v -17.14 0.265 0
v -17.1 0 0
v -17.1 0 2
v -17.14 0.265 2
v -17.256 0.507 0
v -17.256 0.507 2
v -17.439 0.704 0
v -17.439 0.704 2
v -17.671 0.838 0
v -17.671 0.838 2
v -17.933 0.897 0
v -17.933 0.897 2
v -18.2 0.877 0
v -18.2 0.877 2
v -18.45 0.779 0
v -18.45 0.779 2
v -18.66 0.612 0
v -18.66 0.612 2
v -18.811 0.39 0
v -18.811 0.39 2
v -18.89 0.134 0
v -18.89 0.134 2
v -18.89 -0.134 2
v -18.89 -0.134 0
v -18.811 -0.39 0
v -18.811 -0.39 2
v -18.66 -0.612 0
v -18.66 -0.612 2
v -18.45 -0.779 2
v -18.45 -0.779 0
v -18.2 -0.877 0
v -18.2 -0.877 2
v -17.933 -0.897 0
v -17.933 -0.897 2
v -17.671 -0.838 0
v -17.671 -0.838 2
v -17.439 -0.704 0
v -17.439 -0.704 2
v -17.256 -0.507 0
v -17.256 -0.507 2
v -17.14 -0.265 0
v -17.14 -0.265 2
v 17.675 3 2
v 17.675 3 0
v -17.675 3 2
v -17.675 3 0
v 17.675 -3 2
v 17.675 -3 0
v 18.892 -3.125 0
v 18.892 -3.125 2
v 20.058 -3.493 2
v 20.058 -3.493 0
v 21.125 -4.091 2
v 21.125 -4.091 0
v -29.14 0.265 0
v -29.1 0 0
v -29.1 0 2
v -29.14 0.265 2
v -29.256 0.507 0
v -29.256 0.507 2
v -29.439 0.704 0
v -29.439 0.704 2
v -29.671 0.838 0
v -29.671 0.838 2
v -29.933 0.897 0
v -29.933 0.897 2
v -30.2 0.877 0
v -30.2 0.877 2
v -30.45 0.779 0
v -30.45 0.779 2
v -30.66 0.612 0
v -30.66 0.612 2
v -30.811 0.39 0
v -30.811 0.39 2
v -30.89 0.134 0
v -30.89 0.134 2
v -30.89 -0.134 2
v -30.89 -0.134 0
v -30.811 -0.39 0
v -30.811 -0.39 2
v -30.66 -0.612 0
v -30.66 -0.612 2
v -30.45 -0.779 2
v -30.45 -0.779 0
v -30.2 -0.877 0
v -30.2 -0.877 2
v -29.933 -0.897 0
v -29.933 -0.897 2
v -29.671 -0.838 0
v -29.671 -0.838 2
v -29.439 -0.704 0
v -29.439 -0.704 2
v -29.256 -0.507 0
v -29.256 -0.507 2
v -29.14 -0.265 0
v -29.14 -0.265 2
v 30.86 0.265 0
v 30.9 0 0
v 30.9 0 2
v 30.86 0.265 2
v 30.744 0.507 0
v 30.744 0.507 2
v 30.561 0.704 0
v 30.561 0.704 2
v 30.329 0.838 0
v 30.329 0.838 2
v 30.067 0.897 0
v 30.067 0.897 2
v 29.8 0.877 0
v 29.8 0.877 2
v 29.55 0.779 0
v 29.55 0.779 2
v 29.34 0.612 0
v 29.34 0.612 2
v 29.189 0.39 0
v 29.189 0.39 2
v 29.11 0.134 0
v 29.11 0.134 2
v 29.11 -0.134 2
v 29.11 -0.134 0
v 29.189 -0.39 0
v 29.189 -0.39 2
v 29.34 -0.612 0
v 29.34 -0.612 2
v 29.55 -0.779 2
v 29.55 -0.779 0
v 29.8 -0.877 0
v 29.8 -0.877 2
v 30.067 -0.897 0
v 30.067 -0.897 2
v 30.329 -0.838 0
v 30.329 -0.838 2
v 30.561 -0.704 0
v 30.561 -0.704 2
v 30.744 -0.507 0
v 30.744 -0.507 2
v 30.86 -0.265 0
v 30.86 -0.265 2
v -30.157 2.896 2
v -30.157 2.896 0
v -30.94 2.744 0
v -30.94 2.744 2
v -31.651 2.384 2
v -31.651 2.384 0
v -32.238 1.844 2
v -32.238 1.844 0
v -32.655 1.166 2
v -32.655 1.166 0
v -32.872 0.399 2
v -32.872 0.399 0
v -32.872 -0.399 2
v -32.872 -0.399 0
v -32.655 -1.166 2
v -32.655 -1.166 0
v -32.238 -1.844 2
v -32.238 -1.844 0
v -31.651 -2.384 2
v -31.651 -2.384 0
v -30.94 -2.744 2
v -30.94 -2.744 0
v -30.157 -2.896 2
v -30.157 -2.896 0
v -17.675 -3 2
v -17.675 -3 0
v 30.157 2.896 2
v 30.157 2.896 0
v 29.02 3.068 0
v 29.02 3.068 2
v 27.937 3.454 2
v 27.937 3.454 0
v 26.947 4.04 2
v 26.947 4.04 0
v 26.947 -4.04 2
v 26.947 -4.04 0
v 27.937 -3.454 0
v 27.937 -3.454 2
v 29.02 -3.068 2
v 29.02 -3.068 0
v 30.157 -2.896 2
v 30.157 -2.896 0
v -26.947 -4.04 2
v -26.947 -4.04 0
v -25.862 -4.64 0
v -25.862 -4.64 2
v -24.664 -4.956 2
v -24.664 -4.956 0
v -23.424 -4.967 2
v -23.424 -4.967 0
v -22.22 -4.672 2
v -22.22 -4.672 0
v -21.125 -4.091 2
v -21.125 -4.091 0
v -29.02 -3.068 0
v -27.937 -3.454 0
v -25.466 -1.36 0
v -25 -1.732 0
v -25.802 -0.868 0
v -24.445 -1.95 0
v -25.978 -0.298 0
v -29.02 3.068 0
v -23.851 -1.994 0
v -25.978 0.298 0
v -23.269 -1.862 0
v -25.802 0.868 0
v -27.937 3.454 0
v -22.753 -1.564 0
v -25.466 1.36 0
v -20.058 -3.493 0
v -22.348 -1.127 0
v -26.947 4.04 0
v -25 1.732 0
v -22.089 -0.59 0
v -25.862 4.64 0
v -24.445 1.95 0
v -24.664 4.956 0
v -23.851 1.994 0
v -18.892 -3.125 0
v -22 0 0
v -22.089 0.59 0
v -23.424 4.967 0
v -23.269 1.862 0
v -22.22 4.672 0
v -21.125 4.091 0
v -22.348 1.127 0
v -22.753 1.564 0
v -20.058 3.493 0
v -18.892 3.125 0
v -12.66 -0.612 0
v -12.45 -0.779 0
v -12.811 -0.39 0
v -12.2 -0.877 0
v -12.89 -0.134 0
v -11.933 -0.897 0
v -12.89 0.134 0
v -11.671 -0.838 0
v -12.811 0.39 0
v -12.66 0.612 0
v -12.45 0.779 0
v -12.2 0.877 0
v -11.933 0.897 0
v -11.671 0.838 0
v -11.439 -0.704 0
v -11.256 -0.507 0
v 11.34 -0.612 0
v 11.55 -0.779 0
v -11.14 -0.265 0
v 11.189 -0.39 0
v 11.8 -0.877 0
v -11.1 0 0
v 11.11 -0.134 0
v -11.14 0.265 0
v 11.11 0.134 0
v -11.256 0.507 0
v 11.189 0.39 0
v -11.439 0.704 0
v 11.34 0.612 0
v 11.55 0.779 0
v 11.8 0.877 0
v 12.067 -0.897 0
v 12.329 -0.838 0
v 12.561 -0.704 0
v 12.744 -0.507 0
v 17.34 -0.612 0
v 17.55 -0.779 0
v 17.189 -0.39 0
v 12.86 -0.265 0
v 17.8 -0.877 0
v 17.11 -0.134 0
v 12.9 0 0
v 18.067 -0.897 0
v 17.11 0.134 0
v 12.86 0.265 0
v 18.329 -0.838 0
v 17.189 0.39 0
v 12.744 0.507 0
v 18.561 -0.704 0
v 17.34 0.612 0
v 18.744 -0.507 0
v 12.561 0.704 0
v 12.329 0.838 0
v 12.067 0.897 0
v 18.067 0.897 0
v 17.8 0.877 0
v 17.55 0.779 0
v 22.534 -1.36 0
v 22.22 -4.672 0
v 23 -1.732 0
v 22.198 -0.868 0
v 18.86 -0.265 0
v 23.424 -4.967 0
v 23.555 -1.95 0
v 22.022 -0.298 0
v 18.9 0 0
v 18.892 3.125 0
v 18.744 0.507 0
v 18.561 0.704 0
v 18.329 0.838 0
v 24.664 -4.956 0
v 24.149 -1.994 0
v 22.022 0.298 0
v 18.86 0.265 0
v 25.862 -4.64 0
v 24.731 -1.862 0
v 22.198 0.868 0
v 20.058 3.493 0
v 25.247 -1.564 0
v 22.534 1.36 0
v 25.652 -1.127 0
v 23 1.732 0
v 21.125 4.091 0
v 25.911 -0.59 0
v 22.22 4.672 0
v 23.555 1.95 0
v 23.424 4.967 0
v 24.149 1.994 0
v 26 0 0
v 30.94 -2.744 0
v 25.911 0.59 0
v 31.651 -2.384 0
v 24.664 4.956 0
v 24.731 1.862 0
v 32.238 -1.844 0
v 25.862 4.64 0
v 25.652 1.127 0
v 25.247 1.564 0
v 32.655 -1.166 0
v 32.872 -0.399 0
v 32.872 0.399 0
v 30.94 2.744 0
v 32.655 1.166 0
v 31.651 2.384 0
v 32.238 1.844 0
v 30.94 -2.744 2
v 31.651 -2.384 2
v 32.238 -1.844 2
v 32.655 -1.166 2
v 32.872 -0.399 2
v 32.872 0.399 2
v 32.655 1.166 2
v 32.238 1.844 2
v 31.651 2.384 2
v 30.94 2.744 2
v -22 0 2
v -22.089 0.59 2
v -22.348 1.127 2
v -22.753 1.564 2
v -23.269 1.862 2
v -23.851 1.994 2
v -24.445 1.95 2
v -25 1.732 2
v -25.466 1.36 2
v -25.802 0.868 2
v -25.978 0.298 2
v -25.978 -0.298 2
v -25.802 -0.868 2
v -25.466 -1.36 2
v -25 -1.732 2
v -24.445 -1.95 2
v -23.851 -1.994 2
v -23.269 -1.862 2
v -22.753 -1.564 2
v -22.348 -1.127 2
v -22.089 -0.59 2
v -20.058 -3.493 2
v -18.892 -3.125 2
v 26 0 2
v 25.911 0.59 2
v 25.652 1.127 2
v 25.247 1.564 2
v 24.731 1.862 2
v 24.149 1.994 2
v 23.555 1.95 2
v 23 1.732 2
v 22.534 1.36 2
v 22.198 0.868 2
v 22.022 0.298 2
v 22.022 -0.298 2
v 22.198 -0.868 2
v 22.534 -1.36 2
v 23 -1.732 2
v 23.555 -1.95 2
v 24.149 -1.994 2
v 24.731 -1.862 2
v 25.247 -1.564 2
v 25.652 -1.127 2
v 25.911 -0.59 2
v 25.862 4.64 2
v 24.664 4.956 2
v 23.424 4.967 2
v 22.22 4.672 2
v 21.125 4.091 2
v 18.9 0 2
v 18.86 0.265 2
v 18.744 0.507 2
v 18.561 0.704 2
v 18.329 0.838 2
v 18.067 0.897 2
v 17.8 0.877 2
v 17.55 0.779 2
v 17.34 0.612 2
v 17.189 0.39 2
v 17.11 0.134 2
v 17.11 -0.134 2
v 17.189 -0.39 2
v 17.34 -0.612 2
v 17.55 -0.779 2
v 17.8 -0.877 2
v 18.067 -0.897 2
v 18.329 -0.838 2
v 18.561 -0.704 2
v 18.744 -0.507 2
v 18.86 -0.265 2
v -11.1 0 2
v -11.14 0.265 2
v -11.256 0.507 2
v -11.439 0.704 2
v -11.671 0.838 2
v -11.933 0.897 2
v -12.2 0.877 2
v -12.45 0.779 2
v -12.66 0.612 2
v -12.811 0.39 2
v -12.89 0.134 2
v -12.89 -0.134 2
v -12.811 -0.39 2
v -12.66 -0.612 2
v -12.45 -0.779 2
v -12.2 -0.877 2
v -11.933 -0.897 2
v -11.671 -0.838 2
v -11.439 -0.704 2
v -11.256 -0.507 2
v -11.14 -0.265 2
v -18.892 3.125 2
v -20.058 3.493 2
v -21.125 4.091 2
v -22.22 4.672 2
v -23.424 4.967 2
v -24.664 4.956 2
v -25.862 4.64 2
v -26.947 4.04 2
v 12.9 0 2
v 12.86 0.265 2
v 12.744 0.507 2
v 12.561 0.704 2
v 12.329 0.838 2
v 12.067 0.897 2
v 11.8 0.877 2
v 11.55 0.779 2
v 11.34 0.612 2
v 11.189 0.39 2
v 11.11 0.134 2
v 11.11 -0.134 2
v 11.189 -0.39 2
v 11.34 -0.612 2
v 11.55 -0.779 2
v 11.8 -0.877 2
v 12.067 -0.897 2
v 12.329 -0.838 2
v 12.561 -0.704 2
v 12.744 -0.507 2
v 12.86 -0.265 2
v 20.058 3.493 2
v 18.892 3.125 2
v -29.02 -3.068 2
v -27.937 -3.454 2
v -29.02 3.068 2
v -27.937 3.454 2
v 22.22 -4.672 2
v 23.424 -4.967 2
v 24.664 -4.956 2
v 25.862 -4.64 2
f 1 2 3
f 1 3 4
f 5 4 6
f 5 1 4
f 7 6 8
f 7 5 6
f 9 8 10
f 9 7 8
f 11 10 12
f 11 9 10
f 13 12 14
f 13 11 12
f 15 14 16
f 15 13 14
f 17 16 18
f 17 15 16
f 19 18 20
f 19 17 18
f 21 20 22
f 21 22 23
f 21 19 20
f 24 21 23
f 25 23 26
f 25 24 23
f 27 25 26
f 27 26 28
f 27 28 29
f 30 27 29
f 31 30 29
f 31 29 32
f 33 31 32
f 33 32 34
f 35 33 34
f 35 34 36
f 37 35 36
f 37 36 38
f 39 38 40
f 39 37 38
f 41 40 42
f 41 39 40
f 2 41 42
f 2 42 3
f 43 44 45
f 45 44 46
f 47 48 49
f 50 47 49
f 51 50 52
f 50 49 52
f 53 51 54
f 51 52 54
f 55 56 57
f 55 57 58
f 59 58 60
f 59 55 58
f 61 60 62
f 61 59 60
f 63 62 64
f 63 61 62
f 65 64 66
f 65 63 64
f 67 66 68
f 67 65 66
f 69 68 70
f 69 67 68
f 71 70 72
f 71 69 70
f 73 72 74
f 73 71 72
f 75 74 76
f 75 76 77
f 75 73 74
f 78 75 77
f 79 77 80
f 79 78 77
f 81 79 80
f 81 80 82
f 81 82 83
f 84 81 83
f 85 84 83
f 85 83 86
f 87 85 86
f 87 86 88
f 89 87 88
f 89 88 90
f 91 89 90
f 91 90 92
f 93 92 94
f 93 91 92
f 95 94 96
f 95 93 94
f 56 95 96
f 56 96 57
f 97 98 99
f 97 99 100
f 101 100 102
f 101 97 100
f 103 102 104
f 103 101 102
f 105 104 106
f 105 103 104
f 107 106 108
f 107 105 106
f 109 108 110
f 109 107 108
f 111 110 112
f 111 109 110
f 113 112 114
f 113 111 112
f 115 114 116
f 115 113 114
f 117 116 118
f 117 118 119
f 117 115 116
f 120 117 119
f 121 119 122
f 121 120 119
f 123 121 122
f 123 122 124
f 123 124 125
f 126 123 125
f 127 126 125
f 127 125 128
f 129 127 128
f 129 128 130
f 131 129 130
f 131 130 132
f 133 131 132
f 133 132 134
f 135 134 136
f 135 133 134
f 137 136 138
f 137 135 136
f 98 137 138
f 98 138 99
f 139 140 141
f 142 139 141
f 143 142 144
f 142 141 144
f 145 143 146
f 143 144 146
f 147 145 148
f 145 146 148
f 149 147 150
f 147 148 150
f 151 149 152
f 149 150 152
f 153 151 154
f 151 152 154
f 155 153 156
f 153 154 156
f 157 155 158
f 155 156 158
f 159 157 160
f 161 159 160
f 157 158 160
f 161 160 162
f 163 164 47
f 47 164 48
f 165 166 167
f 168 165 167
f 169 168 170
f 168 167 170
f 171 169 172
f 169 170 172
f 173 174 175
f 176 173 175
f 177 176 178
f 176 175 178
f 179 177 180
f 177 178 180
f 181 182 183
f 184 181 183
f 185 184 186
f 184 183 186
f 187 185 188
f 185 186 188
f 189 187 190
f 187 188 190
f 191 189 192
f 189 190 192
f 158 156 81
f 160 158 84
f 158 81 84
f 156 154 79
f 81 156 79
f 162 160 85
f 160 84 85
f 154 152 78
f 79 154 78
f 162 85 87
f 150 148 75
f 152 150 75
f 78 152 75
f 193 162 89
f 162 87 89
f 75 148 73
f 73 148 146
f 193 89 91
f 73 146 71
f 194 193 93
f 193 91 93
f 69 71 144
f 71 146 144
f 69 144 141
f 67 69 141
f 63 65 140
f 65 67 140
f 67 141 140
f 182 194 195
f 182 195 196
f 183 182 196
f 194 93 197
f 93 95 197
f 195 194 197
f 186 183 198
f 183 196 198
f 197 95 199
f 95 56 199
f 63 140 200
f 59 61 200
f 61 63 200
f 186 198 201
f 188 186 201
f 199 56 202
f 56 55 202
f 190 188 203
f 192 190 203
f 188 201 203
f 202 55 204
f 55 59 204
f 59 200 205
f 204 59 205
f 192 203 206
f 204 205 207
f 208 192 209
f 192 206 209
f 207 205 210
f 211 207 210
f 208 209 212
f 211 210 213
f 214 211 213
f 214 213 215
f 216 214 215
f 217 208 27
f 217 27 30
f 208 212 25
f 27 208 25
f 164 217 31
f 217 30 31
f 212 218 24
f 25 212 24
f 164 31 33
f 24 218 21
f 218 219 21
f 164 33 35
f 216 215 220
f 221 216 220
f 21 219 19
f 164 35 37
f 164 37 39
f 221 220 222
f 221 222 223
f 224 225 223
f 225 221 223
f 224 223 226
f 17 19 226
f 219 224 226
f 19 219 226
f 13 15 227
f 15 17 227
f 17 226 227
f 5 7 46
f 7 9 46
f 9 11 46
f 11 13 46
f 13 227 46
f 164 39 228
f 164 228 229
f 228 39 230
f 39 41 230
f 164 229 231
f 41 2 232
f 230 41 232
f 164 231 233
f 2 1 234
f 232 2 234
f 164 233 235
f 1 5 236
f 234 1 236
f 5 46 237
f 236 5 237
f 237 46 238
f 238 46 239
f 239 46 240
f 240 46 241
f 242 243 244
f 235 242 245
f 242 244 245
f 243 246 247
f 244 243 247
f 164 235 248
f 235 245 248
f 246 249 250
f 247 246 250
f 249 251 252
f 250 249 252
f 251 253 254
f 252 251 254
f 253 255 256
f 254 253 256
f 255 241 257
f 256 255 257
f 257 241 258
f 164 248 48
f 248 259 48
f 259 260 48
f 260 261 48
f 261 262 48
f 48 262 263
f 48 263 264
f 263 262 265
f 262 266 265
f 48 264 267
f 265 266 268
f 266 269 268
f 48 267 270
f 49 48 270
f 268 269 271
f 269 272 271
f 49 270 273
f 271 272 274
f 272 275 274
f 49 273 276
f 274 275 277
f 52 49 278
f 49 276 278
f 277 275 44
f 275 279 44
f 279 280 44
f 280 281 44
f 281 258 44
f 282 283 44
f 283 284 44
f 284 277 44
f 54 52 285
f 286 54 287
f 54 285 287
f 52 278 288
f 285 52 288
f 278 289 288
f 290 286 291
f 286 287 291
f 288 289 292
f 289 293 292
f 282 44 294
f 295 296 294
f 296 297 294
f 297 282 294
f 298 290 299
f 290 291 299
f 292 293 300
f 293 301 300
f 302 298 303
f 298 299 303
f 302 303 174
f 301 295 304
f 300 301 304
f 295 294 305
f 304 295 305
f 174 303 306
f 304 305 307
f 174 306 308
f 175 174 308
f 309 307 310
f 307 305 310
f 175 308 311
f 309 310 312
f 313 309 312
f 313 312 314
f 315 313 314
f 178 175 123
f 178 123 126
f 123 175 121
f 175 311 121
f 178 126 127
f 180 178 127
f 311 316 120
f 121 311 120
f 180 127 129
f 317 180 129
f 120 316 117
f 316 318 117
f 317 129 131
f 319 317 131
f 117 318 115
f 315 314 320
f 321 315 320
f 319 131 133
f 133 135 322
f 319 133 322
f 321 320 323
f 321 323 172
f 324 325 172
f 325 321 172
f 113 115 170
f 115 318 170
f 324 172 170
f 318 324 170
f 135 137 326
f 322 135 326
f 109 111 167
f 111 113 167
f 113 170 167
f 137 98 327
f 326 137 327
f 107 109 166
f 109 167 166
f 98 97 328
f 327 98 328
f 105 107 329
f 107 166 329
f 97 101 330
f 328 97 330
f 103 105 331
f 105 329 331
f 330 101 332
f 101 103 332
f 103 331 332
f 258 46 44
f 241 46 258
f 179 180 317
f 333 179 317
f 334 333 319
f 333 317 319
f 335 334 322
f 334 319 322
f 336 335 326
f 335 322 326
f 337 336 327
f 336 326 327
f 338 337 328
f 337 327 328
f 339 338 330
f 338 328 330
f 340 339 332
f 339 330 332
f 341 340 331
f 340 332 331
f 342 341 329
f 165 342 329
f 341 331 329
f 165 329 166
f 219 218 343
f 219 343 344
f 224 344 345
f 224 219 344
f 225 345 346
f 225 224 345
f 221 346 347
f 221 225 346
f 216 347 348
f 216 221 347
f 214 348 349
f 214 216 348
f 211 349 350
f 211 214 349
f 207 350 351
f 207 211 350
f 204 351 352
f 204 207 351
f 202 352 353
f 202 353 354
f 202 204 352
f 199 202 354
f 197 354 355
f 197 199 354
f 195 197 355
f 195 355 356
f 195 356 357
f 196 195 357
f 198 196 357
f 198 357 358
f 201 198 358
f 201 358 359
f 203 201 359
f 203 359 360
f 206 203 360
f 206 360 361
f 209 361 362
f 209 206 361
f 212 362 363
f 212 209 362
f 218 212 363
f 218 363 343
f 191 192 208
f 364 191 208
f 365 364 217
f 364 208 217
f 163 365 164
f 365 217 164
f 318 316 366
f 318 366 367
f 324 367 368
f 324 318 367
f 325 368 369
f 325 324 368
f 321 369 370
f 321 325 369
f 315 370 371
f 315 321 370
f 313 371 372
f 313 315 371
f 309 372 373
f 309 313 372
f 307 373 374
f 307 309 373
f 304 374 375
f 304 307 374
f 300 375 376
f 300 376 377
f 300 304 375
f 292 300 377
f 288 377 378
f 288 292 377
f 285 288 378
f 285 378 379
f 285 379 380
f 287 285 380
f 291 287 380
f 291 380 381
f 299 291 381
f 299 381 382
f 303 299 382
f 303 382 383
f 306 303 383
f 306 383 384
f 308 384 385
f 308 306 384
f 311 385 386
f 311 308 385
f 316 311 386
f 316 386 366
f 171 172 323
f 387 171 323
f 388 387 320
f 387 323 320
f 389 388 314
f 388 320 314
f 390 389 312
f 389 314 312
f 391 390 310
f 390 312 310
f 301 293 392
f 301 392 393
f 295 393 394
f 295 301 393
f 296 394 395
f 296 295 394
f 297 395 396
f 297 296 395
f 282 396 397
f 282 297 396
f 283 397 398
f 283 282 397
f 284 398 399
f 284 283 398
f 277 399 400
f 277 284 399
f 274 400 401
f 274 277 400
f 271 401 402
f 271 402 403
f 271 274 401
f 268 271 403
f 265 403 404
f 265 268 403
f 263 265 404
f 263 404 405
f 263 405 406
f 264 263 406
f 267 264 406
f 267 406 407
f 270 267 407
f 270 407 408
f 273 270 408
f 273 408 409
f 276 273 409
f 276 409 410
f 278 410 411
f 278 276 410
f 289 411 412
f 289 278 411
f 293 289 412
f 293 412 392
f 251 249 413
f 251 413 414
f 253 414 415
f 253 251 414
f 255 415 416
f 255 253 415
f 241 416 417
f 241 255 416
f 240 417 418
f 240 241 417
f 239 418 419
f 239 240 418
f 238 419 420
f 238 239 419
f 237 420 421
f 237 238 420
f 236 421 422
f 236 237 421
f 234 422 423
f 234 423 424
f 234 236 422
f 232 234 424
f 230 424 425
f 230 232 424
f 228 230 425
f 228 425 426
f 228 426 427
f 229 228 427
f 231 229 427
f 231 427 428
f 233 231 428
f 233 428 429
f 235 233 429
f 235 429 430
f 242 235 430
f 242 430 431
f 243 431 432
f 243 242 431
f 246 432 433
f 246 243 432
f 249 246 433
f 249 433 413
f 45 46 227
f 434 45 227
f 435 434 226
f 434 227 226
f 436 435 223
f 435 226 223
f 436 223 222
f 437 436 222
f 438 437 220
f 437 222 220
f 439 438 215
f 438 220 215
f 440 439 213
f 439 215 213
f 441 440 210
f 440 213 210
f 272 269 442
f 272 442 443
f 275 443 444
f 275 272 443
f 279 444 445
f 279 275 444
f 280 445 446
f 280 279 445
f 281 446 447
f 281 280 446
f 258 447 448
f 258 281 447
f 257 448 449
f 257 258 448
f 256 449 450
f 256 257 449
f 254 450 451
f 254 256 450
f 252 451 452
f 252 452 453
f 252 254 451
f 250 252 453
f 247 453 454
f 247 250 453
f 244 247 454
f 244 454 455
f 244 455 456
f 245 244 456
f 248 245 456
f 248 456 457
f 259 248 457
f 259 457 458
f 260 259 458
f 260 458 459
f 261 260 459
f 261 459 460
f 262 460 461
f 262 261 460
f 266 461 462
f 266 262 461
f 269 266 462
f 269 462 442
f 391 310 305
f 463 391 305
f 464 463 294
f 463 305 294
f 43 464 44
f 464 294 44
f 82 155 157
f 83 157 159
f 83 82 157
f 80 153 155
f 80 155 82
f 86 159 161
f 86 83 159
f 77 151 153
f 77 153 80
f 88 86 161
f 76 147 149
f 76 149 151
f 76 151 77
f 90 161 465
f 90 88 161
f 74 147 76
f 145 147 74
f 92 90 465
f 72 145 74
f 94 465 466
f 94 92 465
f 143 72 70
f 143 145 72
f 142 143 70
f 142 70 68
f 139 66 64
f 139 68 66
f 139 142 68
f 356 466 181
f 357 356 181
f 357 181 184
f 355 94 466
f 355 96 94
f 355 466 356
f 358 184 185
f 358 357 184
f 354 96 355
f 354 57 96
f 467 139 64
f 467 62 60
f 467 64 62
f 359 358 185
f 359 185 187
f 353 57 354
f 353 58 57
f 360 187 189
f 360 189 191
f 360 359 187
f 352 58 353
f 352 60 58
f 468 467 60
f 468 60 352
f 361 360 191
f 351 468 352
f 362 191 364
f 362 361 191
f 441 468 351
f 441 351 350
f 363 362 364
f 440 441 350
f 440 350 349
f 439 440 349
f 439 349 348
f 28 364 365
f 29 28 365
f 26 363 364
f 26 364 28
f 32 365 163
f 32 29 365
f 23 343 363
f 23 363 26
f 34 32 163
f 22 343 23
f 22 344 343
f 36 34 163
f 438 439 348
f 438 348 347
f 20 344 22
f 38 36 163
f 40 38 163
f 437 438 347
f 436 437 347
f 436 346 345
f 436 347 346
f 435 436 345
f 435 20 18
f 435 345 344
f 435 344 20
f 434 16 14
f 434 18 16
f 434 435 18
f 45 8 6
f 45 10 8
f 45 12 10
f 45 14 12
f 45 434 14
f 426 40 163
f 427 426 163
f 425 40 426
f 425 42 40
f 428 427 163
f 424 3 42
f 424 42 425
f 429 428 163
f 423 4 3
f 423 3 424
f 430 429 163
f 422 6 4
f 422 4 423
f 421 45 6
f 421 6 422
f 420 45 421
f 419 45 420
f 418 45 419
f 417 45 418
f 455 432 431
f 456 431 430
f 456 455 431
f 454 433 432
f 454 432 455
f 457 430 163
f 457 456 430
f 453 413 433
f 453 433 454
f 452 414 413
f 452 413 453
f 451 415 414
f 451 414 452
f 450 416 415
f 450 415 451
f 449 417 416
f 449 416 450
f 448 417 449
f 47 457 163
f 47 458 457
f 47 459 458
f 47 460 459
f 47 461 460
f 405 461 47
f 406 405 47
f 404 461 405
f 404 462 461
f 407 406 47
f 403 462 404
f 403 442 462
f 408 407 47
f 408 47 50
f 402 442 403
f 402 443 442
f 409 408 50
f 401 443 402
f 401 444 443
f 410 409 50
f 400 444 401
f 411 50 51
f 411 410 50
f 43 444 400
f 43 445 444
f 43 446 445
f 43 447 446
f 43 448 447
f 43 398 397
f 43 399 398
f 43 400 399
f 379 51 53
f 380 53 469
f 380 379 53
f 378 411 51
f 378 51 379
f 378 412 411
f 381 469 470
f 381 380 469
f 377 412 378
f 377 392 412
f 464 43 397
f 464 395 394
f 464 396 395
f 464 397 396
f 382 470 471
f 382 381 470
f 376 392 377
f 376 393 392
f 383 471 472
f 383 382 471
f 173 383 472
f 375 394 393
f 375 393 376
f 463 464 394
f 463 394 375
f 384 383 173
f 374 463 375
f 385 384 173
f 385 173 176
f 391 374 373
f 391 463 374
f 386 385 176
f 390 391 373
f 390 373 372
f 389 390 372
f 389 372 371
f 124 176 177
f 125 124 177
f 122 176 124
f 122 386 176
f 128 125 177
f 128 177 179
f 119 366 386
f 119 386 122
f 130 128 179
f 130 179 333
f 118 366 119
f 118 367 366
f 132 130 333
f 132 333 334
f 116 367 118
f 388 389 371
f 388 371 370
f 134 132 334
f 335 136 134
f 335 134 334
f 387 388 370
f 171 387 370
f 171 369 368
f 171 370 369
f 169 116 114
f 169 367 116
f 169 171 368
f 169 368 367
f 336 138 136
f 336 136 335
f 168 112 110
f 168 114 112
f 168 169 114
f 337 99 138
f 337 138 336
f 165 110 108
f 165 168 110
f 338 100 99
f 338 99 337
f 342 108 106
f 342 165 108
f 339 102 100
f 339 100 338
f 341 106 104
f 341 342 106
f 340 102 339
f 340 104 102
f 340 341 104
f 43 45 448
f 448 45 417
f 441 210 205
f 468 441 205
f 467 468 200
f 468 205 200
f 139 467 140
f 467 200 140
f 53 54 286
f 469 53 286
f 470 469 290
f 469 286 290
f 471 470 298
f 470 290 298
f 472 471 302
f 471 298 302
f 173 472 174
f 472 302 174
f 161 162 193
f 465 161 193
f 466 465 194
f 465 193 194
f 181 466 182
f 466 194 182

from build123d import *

# Parameters (mm, degrees)
F0_R     = 0.9
F0_R_2   = 2
F1_DEPTH = 2


with BuildPart() as f1:
    # F0 (on Top) → F1 (new body)
    with BuildSketch(Plane.XY):
        with BuildLine():
            Line((17.675445, 3), (0, 3))
            Line((0, 3), (-17.675445, 3))
            ThreePointArc((-17.675445, 3), (-19.484513, 3.279224), (-21.125202, 4.090909))
            ThreePointArc((-21.125202, 4.090909), (-24.044149, 4.999805), (-26.946591, 4.039505))
            ThreePointArc((-26.946591, 4.039505), (-28.468983, 3.234854), (-30.157219, 2.895735))
            ThreePointArc((-30.157219, 2.895735), (-32.9, 0), (-30.157219, -2.895735))
            ThreePointArc((-30.157219, -2.895735), (-28.468983, -3.234854), (-26.946591, -4.039505))
            ThreePointArc((-26.946591, -4.039505), (-24.044149, -4.999805), (-21.125202, -4.090909))
            ThreePointArc((-21.125202, -4.090909), (-19.484513, -3.279224), (-17.675445, -3))
            Line((-17.675445, -3), (0, -3))
            Line((0, -3), (17.675445, -3))
            ThreePointArc((17.675445, -3), (19.484513, -3.279224), (21.125202, -4.090909))
            ThreePointArc((21.125202, -4.090909), (24.044149, -4.999805), (26.946591, -4.039505))
            ThreePointArc((26.946591, -4.039505), (28.468983, -3.234854), (30.157219, -2.895735))
            ThreePointArc((30.157219, -2.895735), (32.9, 0), (30.157219, 2.895735))
            ThreePointArc((30.157219, 2.895735), (28.468983, 3.234854), (26.946591, 4.039505))
            ThreePointArc((26.946591, 4.039505), (24.044149, 4.999805), (21.125202, 4.090909))
            ThreePointArc((21.125202, 4.090909), (19.484513, 3.279224), (17.675445, 3))
        make_face()
        with Locations((-30, 0)):
            Circle(F0_R, mode=Mode.SUBTRACT)
        with Locations((-24, 0)):
            Circle(F0_R_2, mode=Mode.SUBTRACT)
        with Locations((-18, 0)):
            Circle(F0_R, mode=Mode.SUBTRACT)
        with Locations((-12, 0)):
            Circle(F0_R, mode=Mode.SUBTRACT)
        with Locations((12, 0)):
            Circle(F0_R, mode=Mode.SUBTRACT)
        with Locations((18, 0)):
            Circle(F0_R, mode=Mode.SUBTRACT)
        with Locations((24, 0)):
            Circle(F0_R_2, mode=Mode.SUBTRACT)
        with Locations((30, 0)):
            Circle(F0_R, mode=Mode.SUBTRACT)
    extrude(amount=F1_DEPTH)


solid = f1.part
